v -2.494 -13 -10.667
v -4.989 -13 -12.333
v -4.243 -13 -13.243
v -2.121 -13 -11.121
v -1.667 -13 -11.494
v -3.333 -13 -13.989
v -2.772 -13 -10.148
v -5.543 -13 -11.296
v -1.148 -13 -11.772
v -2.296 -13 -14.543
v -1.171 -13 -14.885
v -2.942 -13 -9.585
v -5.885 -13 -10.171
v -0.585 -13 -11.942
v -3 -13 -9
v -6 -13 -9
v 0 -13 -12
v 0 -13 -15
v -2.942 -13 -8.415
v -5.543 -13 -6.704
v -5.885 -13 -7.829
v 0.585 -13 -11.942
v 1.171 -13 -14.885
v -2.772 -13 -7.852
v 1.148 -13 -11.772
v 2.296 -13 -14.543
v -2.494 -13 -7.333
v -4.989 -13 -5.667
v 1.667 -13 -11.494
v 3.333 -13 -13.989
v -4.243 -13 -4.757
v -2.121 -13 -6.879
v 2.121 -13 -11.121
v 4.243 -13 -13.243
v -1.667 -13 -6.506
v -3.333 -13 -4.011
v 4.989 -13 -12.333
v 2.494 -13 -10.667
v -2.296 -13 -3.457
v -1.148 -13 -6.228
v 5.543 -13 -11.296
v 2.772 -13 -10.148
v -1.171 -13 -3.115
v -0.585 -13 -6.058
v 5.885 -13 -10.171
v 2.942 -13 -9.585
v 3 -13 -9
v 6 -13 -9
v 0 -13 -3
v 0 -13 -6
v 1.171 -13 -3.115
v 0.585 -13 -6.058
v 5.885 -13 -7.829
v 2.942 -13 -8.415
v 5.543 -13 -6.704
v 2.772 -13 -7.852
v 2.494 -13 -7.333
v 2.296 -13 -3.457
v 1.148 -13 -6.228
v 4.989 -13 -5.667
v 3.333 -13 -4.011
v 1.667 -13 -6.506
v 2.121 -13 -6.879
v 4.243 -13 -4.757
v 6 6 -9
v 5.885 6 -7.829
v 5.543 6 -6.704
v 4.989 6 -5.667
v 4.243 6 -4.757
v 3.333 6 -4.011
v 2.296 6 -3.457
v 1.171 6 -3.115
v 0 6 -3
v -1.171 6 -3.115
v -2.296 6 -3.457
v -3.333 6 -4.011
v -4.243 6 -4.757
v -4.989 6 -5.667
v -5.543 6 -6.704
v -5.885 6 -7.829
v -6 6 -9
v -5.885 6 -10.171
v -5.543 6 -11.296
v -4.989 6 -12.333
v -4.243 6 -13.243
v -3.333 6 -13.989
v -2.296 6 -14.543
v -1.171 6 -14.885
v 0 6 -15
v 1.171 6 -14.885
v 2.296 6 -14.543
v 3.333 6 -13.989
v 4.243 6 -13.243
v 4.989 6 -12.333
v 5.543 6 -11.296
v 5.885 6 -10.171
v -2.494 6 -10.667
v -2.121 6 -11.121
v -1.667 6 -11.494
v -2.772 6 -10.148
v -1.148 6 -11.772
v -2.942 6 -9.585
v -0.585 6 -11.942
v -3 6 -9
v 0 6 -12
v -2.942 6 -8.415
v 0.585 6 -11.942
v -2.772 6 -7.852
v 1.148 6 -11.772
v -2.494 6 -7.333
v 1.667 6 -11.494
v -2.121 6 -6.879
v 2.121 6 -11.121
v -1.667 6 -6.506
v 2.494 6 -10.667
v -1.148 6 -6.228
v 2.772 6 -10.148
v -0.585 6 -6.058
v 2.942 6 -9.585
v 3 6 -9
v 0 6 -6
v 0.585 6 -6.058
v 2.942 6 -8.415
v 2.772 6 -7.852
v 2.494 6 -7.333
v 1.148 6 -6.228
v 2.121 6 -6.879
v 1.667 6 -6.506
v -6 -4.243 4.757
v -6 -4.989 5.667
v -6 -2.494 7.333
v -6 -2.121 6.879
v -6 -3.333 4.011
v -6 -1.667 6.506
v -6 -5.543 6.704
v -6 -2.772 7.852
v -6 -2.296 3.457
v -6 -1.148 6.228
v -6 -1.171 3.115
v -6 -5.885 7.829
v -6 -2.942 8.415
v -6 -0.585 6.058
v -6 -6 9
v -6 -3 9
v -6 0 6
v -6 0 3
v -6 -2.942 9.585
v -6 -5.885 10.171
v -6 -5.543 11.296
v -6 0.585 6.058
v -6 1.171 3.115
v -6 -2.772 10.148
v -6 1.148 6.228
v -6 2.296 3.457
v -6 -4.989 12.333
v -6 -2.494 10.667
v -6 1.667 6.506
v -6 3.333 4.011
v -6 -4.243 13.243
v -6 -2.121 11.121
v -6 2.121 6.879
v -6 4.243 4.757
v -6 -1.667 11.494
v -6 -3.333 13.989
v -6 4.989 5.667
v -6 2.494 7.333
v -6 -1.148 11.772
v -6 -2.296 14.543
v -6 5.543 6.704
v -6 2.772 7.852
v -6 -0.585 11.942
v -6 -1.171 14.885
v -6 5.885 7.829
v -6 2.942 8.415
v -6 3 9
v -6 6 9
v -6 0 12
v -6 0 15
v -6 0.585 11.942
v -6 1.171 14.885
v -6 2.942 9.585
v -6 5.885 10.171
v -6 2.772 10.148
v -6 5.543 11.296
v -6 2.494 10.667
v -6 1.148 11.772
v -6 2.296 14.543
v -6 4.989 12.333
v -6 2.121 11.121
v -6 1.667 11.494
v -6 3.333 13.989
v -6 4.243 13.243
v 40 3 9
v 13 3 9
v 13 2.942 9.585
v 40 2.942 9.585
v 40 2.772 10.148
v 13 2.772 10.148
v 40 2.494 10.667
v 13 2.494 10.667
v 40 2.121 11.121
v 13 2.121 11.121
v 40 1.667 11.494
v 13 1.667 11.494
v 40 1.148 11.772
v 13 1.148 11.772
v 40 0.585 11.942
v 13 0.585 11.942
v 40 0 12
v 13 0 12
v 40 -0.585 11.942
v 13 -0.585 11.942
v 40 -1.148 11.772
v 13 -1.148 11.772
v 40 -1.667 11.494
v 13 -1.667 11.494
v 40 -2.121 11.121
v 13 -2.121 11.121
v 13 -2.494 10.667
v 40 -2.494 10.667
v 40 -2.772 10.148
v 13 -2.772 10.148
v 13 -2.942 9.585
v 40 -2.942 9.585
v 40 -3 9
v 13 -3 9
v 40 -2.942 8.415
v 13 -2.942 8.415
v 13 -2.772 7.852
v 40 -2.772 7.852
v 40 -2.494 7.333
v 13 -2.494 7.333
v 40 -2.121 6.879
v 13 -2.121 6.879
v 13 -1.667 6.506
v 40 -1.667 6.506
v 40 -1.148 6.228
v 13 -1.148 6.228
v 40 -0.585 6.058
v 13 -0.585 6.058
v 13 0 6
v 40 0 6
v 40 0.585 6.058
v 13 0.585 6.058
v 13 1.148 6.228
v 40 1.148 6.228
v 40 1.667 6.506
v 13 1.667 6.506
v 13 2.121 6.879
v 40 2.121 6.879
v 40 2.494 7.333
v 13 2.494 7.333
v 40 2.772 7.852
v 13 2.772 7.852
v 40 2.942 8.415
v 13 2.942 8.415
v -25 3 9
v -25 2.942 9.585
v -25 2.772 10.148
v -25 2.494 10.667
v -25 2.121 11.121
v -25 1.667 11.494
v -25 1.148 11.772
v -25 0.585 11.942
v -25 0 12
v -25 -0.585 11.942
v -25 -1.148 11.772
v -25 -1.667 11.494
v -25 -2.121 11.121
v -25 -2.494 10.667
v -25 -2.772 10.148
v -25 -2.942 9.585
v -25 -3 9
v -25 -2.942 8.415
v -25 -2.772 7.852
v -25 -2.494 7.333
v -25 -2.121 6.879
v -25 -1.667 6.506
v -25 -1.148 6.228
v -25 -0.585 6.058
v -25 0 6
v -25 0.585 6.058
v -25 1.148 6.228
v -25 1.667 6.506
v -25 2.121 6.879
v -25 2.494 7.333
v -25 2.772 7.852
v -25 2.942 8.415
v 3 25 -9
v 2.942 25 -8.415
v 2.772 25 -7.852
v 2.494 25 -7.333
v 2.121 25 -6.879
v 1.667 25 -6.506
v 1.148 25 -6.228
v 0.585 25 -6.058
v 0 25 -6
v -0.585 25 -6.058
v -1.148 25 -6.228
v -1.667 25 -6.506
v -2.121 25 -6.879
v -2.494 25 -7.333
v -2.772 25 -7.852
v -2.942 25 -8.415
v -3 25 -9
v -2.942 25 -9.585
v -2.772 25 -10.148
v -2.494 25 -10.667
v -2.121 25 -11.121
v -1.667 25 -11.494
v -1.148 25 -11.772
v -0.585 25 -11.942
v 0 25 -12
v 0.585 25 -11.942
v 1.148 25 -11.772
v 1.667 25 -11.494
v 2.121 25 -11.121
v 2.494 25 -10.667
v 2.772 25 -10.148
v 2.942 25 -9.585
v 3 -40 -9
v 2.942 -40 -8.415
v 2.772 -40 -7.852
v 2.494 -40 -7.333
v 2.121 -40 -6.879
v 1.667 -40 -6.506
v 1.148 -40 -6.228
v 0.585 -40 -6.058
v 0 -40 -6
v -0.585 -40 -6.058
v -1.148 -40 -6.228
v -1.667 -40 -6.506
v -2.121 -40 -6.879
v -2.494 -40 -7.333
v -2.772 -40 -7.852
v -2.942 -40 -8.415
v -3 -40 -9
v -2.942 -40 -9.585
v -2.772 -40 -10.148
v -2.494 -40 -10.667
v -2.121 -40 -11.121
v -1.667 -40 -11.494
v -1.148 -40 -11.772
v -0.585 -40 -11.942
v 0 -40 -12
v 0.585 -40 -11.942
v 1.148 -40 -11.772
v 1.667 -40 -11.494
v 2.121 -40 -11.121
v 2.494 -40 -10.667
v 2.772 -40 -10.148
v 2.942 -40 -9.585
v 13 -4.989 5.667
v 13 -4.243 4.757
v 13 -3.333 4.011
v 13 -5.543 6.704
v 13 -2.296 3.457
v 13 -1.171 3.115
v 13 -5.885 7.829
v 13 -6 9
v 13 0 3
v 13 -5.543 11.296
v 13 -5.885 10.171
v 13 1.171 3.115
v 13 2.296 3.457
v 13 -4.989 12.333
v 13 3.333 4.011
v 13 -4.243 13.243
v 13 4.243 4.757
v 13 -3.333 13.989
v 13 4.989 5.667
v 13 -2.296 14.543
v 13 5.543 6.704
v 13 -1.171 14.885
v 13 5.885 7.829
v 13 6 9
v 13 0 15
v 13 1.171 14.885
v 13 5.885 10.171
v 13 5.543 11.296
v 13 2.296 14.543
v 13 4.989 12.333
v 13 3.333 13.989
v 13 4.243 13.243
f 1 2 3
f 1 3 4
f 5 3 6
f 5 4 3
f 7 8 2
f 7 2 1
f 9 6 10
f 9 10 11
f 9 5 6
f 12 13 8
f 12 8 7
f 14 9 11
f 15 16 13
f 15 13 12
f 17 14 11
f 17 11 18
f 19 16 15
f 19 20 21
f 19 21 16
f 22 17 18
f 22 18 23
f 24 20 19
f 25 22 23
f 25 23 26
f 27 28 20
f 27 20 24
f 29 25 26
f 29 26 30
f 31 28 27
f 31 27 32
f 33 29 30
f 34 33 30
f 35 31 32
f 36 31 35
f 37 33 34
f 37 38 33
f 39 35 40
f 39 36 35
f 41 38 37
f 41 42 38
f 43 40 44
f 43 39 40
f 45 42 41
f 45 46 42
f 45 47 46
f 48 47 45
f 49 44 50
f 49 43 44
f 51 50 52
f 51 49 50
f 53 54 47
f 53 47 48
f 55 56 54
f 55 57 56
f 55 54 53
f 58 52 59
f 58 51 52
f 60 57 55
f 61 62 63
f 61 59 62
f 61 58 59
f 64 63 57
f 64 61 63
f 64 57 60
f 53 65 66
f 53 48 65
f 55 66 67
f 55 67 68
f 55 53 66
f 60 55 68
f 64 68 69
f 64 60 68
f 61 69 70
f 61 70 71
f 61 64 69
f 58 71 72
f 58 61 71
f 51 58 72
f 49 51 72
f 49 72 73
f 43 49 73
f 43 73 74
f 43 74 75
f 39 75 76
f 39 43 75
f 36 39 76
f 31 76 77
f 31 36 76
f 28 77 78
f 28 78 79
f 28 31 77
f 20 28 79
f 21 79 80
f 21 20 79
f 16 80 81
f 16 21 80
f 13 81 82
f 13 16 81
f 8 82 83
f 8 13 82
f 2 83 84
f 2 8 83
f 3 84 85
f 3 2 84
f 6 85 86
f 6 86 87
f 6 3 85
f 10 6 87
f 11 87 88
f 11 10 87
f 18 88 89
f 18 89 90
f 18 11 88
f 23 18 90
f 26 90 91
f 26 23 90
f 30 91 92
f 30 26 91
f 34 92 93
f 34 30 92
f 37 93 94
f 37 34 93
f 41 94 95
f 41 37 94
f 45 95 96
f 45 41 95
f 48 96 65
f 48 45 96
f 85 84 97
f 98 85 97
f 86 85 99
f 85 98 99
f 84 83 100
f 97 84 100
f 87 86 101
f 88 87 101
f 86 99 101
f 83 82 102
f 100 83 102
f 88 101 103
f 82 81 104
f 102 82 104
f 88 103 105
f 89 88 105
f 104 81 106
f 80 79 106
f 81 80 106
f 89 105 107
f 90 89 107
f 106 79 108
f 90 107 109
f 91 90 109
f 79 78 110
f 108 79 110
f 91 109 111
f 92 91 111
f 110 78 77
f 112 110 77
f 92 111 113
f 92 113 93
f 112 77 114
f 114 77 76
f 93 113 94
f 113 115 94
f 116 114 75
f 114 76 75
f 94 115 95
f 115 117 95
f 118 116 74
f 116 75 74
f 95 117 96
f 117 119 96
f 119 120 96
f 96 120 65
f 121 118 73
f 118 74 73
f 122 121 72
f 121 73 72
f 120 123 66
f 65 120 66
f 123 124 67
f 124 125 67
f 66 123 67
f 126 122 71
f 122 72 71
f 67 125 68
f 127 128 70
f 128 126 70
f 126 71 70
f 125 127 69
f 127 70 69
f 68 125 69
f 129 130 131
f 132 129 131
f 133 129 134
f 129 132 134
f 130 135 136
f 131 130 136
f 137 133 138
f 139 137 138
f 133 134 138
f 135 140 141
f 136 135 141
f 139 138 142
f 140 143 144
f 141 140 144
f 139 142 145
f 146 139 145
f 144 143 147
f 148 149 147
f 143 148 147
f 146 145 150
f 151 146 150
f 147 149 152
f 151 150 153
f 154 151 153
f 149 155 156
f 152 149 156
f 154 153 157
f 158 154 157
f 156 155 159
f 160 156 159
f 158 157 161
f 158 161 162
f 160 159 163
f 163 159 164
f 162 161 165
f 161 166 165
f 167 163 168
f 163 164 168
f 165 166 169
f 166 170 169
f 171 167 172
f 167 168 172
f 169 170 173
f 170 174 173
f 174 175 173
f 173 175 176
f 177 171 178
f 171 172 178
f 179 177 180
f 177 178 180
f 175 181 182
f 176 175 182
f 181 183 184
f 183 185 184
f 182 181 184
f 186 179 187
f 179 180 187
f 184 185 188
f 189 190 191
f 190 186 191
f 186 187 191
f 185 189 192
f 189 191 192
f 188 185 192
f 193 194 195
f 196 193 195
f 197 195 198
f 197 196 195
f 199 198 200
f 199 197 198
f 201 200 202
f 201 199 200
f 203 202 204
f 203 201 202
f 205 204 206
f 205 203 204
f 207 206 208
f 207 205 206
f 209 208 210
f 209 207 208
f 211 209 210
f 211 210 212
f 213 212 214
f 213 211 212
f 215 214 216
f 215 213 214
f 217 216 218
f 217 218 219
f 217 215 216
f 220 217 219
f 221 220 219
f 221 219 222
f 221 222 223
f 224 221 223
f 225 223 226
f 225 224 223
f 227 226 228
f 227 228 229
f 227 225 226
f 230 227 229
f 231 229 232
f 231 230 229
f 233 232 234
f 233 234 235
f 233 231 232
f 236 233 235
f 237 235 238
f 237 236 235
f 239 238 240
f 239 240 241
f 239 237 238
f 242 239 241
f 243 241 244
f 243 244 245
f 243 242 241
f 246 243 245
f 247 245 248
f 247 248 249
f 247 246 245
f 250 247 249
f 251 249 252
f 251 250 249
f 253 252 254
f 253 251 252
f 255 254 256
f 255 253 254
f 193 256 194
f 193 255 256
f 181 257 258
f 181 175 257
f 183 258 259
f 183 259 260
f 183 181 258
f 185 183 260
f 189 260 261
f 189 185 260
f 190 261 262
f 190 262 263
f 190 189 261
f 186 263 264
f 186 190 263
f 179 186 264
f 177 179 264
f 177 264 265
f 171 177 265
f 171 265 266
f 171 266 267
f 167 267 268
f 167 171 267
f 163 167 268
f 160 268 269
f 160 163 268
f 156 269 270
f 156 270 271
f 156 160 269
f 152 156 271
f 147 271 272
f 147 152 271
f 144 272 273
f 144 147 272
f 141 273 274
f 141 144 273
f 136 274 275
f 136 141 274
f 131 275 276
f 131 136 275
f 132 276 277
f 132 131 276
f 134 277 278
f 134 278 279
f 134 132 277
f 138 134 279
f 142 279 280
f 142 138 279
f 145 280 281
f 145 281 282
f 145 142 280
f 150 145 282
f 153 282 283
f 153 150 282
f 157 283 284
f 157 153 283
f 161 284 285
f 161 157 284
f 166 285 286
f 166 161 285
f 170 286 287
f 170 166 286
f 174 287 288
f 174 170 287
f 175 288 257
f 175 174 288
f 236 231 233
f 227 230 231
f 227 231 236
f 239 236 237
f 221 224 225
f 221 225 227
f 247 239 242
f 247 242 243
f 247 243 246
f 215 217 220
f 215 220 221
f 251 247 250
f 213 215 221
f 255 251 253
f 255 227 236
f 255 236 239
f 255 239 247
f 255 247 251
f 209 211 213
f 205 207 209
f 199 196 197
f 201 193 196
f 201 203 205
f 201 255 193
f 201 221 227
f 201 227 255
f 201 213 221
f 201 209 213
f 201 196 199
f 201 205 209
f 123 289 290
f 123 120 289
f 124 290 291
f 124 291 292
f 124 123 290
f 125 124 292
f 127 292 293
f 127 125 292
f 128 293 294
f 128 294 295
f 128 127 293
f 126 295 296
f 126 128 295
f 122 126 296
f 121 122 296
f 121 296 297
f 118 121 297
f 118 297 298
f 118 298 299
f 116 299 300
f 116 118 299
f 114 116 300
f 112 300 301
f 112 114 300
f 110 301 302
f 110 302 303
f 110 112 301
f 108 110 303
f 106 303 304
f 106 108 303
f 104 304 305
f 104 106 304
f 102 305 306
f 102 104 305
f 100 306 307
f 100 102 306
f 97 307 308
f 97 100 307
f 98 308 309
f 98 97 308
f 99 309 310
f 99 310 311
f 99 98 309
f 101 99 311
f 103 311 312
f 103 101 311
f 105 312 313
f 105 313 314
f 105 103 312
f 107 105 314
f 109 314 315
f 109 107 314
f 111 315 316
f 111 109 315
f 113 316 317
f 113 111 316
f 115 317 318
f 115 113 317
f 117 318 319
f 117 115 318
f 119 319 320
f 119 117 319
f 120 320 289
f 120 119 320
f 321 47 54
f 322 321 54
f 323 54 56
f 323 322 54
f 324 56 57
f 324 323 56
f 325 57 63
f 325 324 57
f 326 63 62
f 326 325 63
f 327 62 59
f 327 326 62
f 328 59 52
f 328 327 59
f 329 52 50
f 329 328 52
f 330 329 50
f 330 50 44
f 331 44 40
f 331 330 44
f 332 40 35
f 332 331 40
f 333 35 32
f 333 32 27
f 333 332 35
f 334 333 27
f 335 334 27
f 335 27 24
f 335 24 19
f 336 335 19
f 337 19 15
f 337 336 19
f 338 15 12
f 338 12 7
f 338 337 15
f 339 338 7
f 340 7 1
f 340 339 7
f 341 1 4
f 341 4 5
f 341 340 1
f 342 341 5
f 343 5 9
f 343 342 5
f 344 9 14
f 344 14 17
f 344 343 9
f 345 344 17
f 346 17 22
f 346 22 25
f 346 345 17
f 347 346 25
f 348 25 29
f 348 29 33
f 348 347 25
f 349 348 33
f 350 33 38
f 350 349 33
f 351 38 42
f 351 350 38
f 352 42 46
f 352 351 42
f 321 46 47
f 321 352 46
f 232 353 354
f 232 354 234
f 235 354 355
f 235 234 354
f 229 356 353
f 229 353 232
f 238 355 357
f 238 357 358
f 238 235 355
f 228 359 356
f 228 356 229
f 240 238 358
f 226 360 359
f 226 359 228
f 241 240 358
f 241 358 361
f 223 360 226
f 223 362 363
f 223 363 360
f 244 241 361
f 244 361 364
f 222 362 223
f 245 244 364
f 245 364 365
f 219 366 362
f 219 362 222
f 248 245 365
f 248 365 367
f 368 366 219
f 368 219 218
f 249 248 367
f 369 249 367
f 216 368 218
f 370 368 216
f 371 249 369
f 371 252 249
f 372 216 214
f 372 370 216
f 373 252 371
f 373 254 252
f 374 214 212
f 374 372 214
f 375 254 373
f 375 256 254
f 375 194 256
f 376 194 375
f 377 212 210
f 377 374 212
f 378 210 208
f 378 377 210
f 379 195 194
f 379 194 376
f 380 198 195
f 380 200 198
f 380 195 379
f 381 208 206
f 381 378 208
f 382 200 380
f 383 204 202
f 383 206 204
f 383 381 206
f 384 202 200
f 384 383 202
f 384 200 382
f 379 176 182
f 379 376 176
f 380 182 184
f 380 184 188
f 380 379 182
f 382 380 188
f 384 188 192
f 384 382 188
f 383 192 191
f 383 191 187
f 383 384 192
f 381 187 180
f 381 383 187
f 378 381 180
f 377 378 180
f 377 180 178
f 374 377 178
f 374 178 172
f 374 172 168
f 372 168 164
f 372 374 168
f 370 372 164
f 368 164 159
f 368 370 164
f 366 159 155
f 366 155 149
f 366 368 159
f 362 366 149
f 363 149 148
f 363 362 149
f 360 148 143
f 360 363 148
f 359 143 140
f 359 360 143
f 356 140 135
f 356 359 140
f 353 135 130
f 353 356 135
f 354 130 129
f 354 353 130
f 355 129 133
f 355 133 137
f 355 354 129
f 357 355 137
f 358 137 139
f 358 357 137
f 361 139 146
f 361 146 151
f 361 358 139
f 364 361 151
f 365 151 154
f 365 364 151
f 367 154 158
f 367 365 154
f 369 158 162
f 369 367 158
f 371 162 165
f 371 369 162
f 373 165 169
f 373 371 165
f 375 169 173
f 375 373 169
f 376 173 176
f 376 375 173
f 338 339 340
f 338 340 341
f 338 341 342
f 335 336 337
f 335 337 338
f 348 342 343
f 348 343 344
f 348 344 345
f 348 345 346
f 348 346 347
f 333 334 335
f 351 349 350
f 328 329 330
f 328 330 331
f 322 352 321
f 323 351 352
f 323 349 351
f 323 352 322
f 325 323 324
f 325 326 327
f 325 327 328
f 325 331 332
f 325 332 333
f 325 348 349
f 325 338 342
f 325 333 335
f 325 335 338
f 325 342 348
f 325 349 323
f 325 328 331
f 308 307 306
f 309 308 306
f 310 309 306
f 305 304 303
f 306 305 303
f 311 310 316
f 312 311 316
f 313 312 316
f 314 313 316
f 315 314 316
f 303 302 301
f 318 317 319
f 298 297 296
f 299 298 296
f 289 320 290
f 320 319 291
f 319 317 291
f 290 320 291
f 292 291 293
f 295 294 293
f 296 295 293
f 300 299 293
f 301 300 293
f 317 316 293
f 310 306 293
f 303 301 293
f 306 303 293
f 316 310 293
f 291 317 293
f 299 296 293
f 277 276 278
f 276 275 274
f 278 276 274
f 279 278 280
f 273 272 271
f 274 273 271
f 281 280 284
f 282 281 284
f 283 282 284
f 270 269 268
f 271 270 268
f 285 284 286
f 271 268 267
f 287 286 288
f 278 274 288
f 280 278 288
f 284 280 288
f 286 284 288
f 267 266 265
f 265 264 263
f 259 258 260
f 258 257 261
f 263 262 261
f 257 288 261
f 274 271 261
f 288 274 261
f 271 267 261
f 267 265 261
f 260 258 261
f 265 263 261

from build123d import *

# Parameters (mm, degrees)
F4_R          = 3
F5_DEPTH      = 40
F5_DEPTH_BACK = 25
F4_R_2        = 6
F6_DEPTH      = 13
F6_DEPTH_BACK = 6
F3_R          = 3
F7_DEPTH      = 40
F7_DEPTH_BACK = 25
F3_R_2        = 6
F8_DEPTH      = 13
F8_DEPTH_BACK = 6


with BuildPart() as f5:
    # F4 (on Right) → F5 (new body, two sides)
    with BuildSketch(Plane.YZ) as f5_sk:
        with Locations((0, 9)):
            Circle(F4_R)
    extrude(amount=F5_DEPTH)
    extrude(f5_sk.sketch, amount=-F5_DEPTH_BACK)

    # F4 (on Right) → F6 (join, two sides)
    with BuildSketch(Plane.YZ) as f6_sk:
        with Locations((0, 9)):
            Circle(F4_R_2)
        with Locations((0, 9)):
            Circle(F4_R, mode=Mode.SUBTRACT)
    extrude(amount=F6_DEPTH)
    extrude(f6_sk.sketch, amount=-F6_DEPTH_BACK)


with BuildPart() as f7:
    # F3 (on Front) → F7 (new body, two sides)
    with BuildSketch(Plane.XZ) as f7_sk:
        with Locations((0, -9)):
            Circle(F3_R)
    extrude(amount=F7_DEPTH)
    extrude(f7_sk.sketch, amount=-F7_DEPTH_BACK)

    # F3 (on Front) → F8 (join, two sides)
    with BuildSketch(Plane.XZ) as f8_sk:
        with Locations((0, -9)):
            Circle(F3_R_2)
        with Locations((0, -9)):
            Circle(F3_R, mode=Mode.SUBTRACT)
    extrude(amount=F8_DEPTH)
    extrude(f8_sk.sketch, amount=-F8_DEPTH_BACK)


solid = Compound([f5.part, f7.part])
